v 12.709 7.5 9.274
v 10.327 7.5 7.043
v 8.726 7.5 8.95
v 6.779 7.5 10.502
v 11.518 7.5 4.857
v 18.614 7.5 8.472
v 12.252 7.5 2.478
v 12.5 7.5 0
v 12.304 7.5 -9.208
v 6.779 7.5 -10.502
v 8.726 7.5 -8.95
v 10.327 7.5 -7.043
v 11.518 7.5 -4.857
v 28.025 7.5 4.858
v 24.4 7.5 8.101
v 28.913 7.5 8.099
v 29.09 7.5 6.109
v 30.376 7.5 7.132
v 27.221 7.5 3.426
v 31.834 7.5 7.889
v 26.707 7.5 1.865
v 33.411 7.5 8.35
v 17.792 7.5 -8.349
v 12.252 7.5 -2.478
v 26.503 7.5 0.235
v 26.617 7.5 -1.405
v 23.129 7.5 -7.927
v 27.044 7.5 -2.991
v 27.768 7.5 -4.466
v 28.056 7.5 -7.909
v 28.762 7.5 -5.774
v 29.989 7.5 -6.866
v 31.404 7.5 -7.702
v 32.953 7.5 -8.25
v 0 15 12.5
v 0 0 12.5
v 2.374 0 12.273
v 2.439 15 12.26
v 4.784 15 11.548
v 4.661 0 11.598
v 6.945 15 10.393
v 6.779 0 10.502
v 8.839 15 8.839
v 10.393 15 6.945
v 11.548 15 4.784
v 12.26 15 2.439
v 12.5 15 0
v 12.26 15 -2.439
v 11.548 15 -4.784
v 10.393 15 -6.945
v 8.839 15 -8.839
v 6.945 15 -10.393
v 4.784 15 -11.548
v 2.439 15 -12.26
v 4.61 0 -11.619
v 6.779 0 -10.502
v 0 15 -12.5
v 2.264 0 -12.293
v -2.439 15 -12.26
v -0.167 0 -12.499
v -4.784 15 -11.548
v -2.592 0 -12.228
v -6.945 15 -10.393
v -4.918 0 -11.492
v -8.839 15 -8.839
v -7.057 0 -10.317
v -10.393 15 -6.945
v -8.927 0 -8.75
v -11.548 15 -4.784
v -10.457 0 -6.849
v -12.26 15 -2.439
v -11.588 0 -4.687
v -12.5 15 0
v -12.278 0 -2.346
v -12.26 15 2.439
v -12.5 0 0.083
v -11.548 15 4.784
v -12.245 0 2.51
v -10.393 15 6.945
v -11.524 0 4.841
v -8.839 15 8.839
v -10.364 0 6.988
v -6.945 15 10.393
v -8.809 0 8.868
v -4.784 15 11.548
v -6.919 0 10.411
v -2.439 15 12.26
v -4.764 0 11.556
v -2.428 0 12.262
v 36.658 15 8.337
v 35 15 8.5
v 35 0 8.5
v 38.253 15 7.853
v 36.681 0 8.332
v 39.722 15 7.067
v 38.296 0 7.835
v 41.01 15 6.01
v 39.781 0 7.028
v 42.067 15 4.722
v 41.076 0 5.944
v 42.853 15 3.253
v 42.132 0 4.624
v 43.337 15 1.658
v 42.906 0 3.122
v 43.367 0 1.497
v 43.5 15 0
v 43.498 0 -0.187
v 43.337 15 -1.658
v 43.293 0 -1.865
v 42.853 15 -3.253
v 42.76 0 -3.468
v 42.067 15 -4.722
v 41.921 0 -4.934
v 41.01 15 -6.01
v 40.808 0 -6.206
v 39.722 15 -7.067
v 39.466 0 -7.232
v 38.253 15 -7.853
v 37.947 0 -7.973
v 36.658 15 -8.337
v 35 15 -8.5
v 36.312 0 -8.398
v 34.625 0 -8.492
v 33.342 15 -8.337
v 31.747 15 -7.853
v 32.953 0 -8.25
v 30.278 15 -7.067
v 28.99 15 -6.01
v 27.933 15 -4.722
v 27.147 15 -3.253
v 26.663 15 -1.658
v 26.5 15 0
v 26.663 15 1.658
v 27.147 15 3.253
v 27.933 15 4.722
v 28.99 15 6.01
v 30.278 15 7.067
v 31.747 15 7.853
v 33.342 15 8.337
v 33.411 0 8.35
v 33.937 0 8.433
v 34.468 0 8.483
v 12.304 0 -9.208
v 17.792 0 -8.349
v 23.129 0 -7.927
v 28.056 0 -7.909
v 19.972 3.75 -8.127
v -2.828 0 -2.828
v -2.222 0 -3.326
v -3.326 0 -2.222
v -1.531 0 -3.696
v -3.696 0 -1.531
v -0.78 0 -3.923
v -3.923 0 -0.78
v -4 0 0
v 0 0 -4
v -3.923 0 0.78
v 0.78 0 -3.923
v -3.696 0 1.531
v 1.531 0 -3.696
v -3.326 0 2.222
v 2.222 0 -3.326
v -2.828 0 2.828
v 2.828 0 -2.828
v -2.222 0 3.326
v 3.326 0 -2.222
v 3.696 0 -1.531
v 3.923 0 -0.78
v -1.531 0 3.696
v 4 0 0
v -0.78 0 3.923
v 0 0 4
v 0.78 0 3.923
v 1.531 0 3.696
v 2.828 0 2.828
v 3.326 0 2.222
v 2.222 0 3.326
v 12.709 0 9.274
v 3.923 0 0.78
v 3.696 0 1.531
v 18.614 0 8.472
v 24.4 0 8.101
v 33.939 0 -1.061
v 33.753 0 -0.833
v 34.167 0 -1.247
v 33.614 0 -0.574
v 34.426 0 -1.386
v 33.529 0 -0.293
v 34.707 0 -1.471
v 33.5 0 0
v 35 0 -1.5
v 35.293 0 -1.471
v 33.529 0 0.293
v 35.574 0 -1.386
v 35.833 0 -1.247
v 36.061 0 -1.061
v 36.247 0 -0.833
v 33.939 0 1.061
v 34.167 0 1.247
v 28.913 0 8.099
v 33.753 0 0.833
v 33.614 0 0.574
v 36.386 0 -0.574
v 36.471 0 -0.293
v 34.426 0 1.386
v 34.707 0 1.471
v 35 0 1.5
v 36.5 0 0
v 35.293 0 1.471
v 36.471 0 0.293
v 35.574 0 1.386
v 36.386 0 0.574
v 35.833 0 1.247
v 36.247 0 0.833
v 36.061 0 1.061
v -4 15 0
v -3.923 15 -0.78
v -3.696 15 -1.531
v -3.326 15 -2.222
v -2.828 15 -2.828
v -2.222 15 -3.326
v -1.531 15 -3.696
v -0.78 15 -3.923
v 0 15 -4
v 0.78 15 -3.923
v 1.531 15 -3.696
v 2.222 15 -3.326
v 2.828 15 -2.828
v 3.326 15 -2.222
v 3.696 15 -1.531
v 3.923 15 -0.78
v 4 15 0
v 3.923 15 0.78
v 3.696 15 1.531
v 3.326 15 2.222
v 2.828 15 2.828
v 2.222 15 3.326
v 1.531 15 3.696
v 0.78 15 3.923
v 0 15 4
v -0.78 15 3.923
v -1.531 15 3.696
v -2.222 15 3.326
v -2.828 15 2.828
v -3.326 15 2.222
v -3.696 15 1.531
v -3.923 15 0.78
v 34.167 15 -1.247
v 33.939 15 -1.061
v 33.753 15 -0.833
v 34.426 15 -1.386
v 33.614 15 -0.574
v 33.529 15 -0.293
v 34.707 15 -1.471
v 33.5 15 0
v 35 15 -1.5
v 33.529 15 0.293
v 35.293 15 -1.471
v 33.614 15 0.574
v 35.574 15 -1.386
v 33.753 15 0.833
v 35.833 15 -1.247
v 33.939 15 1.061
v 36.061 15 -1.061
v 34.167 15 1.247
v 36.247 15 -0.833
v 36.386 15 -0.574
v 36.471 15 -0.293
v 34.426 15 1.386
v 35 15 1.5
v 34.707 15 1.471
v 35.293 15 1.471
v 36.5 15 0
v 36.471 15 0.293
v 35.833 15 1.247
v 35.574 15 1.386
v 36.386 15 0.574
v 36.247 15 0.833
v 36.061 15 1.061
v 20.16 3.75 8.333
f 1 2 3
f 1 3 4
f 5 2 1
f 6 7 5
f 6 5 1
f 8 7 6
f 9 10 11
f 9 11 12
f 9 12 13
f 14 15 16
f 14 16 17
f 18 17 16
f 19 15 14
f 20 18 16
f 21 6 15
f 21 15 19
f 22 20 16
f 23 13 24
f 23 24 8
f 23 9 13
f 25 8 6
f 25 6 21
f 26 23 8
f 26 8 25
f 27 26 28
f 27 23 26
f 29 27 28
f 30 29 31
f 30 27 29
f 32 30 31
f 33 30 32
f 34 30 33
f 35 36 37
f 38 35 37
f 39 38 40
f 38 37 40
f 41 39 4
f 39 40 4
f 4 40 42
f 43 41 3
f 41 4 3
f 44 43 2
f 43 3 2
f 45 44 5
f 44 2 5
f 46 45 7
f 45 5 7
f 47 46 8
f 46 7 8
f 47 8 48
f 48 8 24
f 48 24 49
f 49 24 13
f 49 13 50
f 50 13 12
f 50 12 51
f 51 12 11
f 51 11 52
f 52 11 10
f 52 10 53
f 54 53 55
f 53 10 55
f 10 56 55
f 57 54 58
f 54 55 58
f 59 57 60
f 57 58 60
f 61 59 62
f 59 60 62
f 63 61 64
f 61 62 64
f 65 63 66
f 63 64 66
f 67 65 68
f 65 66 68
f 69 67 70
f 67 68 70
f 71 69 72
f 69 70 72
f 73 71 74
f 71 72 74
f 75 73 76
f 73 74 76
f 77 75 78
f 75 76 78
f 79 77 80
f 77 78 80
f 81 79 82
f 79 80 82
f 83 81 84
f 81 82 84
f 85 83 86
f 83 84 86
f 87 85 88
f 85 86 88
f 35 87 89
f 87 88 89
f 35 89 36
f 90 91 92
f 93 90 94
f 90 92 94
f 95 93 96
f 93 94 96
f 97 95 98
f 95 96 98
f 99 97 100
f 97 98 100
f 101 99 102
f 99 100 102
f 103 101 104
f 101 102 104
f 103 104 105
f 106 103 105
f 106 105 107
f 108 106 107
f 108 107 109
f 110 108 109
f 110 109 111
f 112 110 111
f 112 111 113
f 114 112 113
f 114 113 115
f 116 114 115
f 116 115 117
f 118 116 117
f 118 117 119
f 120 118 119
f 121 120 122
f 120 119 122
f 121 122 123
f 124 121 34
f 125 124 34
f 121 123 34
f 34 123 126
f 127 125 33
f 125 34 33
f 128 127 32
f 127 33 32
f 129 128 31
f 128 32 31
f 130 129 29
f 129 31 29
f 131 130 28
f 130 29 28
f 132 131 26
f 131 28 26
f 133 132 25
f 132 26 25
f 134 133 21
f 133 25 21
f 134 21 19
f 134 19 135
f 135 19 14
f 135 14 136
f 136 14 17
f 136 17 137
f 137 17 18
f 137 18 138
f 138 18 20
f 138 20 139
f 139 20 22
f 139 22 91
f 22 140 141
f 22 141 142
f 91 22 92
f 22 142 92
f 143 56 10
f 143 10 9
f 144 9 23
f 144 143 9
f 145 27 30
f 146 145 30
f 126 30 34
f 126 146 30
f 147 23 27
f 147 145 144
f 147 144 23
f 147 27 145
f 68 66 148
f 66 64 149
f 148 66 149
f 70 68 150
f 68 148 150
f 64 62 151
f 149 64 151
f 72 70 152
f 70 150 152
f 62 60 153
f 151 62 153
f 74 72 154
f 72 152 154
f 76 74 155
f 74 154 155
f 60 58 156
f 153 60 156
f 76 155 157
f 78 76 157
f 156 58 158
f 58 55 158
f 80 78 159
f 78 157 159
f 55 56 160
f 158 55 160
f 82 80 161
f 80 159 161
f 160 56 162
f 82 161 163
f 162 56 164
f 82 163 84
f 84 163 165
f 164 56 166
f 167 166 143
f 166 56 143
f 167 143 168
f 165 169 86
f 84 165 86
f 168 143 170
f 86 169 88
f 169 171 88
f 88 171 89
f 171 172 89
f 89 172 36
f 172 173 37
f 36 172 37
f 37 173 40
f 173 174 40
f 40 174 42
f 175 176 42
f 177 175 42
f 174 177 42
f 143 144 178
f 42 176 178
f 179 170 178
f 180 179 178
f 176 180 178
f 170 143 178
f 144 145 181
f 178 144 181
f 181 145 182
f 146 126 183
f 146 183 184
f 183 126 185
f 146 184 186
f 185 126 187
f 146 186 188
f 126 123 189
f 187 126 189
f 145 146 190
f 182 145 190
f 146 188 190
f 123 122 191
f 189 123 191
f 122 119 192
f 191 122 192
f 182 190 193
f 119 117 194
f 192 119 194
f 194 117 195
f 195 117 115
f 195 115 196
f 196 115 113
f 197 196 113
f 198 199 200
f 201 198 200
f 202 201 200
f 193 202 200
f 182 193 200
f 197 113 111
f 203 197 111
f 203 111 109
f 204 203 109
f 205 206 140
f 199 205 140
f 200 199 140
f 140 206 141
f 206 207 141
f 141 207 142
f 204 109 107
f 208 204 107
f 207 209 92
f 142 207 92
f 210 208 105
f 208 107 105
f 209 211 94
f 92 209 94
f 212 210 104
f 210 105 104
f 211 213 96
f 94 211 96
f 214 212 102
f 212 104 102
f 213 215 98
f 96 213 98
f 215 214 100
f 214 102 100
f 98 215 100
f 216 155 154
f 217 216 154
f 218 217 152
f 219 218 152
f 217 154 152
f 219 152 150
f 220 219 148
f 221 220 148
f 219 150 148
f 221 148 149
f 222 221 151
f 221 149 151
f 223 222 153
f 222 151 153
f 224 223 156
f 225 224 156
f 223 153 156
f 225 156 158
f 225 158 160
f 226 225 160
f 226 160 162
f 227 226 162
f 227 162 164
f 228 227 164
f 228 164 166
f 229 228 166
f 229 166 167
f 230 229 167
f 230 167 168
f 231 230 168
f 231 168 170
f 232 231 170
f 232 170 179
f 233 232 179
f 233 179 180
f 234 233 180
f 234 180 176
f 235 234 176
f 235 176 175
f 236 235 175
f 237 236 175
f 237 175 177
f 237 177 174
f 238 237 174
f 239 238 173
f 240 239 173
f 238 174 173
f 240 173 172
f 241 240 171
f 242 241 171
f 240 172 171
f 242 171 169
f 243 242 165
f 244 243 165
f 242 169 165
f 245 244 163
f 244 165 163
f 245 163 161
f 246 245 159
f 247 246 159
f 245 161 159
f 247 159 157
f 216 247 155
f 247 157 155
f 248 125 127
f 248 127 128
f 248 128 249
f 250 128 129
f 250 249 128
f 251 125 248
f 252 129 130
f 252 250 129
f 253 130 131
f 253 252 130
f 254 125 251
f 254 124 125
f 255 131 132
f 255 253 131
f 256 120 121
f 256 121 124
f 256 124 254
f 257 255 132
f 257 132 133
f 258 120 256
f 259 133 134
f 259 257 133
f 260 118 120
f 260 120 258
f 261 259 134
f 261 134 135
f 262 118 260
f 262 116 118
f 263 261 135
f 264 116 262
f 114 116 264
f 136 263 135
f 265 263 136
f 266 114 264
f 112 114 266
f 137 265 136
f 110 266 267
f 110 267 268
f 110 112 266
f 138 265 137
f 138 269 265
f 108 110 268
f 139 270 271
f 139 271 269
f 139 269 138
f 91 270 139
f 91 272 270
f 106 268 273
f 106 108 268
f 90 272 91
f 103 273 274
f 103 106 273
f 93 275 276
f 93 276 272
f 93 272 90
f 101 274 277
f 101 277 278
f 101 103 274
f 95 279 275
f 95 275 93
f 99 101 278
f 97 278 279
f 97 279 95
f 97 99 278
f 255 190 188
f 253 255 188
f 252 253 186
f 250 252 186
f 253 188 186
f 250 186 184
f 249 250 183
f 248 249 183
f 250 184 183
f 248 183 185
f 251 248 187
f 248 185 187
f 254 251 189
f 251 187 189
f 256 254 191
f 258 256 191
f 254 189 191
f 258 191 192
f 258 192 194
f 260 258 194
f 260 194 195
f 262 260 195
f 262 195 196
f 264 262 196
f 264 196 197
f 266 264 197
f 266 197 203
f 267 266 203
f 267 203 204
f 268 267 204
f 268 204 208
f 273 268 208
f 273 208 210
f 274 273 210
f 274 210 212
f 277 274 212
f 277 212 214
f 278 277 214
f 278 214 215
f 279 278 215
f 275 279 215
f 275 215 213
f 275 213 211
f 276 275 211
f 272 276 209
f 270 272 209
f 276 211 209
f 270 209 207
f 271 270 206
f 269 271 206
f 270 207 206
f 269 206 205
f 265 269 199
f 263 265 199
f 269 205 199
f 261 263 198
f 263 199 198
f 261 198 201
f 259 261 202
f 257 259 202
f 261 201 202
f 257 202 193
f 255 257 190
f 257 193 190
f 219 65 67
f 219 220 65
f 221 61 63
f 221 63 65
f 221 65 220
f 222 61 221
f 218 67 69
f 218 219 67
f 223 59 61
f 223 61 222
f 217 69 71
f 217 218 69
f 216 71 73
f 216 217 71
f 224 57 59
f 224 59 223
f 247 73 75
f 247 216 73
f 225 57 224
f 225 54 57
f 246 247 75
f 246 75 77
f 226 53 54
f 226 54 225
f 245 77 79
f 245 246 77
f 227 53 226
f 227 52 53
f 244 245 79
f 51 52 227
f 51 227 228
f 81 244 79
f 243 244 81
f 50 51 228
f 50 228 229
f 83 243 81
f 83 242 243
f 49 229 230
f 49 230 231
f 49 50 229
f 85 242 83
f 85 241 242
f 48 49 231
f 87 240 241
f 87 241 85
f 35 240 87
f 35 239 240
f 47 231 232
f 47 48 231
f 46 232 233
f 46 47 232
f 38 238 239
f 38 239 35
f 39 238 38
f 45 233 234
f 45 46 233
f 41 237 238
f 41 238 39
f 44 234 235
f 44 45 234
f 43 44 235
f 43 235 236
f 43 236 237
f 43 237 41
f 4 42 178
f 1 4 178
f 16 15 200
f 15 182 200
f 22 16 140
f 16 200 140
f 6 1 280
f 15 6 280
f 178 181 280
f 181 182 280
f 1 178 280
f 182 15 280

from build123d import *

# Parameters (mm, degrees)
SZKIC1_R                    = 12.5
DODANIE_WYCI_GNI_CIE2_DEPTH = 15
SZKIC3_R                    = 8.5
DODANIE_WYCI_GNI_CIE3_DEPTH = 15
DODANIE_WYCI_GNI_CIE4_DEPTH = 7.5
OTWORY_USTALAJ_CE_8_0MM1_D  = 8
OTWORY_USTALAJ_CE_3_0MM2_D  = 3


with BuildPart() as part:
    # Szkic1 → Dodanie-wyciągnięcie2 (new body)
    with BuildSketch(Plane(origin=(0, 0, 0), x_dir=(1, 0, 0), z_dir=(0, 1, 0))):
        with Locations(Location((0, 0, 0), (0, 0, 270))):
            Circle(SZKIC1_R)
    extrude(amount=DODANIE_WYCI_GNI_CIE2_DEPTH)



with BuildPart() as body_2:
    # Szkic3 → Dodanie-wyciągnięcie3 (new body)
    with BuildSketch(Plane(origin=(0, 0, 0), x_dir=(1, 0, 0), z_dir=(0, 1, 0))):
        with Locations(Location((35, 0, 0), (0, 0, 270))):
            Circle(SZKIC3_R)
    extrude(amount=DODANIE_WYCI_GNI_CIE3_DEPTH)


with BuildPart() as part_1:
    add(part.part)

    add(body_2.part)  # Dodanie-wyciągnięcie4 merges body 2
    # Szkic4 → Dodanie-wyciągnięcie4 (add)
    with BuildSketch(Plane(origin=(0, 0, 0), x_dir=(-1, 0, 0), z_dir=(0, -1, 0))):
        with BuildLine():
            ThreePointArc((-6.778939078, 10.502189533), (-12.5, 0), (-6.778939078, -10.502189533))
            add(Edge.make_bspline(
                [(-6.778939078, -10.502189533), (-20.225507154, -7.239536671), (-33.411274741, -8.350206707)],
                knots=[0, 0, 0, 0.631379274, 0.631379274, 0.631379274], degree=2))
            ThreePointArc((-33.411274741, -8.350206707), (-26.503236916, -0.234557237), (-32.953022418, 8.249841379))
            add(Edge.make_bspline(
                [(-6.778939078, 10.502189533), (-20.078070114, 6.877362512), (-32.953022418, 8.249841379)],
                knots=[0, 0, 0, 0.617827196, 0.617827196, 0.617827196], degree=2))
        make_face()
    extrude(amount=-DODANIE_WYCI_GNI_CIE4_DEPTH)

    # Otwory ustalające Ø8.0mm1 (through all)
    with Locations(Plane(origin=(0, 15, 0), x_dir=(1, 0, 0), z_dir=(0, 1, 0))):
        with Locations((0, 0)):
            Hole(OTWORY_USTALAJ_CE_8_0MM1_D / 2)

    # Otwory ustalające Ø3.0mm2 (through all)
    with Locations(Plane(origin=(0, 15, 0), x_dir=(1, 0, 0), z_dir=(0, 1, 0))):
        with Locations((35, 0)):
            Hole(OTWORY_USTALAJ_CE_3_0MM2_D / 2)


solid = part_1.part
